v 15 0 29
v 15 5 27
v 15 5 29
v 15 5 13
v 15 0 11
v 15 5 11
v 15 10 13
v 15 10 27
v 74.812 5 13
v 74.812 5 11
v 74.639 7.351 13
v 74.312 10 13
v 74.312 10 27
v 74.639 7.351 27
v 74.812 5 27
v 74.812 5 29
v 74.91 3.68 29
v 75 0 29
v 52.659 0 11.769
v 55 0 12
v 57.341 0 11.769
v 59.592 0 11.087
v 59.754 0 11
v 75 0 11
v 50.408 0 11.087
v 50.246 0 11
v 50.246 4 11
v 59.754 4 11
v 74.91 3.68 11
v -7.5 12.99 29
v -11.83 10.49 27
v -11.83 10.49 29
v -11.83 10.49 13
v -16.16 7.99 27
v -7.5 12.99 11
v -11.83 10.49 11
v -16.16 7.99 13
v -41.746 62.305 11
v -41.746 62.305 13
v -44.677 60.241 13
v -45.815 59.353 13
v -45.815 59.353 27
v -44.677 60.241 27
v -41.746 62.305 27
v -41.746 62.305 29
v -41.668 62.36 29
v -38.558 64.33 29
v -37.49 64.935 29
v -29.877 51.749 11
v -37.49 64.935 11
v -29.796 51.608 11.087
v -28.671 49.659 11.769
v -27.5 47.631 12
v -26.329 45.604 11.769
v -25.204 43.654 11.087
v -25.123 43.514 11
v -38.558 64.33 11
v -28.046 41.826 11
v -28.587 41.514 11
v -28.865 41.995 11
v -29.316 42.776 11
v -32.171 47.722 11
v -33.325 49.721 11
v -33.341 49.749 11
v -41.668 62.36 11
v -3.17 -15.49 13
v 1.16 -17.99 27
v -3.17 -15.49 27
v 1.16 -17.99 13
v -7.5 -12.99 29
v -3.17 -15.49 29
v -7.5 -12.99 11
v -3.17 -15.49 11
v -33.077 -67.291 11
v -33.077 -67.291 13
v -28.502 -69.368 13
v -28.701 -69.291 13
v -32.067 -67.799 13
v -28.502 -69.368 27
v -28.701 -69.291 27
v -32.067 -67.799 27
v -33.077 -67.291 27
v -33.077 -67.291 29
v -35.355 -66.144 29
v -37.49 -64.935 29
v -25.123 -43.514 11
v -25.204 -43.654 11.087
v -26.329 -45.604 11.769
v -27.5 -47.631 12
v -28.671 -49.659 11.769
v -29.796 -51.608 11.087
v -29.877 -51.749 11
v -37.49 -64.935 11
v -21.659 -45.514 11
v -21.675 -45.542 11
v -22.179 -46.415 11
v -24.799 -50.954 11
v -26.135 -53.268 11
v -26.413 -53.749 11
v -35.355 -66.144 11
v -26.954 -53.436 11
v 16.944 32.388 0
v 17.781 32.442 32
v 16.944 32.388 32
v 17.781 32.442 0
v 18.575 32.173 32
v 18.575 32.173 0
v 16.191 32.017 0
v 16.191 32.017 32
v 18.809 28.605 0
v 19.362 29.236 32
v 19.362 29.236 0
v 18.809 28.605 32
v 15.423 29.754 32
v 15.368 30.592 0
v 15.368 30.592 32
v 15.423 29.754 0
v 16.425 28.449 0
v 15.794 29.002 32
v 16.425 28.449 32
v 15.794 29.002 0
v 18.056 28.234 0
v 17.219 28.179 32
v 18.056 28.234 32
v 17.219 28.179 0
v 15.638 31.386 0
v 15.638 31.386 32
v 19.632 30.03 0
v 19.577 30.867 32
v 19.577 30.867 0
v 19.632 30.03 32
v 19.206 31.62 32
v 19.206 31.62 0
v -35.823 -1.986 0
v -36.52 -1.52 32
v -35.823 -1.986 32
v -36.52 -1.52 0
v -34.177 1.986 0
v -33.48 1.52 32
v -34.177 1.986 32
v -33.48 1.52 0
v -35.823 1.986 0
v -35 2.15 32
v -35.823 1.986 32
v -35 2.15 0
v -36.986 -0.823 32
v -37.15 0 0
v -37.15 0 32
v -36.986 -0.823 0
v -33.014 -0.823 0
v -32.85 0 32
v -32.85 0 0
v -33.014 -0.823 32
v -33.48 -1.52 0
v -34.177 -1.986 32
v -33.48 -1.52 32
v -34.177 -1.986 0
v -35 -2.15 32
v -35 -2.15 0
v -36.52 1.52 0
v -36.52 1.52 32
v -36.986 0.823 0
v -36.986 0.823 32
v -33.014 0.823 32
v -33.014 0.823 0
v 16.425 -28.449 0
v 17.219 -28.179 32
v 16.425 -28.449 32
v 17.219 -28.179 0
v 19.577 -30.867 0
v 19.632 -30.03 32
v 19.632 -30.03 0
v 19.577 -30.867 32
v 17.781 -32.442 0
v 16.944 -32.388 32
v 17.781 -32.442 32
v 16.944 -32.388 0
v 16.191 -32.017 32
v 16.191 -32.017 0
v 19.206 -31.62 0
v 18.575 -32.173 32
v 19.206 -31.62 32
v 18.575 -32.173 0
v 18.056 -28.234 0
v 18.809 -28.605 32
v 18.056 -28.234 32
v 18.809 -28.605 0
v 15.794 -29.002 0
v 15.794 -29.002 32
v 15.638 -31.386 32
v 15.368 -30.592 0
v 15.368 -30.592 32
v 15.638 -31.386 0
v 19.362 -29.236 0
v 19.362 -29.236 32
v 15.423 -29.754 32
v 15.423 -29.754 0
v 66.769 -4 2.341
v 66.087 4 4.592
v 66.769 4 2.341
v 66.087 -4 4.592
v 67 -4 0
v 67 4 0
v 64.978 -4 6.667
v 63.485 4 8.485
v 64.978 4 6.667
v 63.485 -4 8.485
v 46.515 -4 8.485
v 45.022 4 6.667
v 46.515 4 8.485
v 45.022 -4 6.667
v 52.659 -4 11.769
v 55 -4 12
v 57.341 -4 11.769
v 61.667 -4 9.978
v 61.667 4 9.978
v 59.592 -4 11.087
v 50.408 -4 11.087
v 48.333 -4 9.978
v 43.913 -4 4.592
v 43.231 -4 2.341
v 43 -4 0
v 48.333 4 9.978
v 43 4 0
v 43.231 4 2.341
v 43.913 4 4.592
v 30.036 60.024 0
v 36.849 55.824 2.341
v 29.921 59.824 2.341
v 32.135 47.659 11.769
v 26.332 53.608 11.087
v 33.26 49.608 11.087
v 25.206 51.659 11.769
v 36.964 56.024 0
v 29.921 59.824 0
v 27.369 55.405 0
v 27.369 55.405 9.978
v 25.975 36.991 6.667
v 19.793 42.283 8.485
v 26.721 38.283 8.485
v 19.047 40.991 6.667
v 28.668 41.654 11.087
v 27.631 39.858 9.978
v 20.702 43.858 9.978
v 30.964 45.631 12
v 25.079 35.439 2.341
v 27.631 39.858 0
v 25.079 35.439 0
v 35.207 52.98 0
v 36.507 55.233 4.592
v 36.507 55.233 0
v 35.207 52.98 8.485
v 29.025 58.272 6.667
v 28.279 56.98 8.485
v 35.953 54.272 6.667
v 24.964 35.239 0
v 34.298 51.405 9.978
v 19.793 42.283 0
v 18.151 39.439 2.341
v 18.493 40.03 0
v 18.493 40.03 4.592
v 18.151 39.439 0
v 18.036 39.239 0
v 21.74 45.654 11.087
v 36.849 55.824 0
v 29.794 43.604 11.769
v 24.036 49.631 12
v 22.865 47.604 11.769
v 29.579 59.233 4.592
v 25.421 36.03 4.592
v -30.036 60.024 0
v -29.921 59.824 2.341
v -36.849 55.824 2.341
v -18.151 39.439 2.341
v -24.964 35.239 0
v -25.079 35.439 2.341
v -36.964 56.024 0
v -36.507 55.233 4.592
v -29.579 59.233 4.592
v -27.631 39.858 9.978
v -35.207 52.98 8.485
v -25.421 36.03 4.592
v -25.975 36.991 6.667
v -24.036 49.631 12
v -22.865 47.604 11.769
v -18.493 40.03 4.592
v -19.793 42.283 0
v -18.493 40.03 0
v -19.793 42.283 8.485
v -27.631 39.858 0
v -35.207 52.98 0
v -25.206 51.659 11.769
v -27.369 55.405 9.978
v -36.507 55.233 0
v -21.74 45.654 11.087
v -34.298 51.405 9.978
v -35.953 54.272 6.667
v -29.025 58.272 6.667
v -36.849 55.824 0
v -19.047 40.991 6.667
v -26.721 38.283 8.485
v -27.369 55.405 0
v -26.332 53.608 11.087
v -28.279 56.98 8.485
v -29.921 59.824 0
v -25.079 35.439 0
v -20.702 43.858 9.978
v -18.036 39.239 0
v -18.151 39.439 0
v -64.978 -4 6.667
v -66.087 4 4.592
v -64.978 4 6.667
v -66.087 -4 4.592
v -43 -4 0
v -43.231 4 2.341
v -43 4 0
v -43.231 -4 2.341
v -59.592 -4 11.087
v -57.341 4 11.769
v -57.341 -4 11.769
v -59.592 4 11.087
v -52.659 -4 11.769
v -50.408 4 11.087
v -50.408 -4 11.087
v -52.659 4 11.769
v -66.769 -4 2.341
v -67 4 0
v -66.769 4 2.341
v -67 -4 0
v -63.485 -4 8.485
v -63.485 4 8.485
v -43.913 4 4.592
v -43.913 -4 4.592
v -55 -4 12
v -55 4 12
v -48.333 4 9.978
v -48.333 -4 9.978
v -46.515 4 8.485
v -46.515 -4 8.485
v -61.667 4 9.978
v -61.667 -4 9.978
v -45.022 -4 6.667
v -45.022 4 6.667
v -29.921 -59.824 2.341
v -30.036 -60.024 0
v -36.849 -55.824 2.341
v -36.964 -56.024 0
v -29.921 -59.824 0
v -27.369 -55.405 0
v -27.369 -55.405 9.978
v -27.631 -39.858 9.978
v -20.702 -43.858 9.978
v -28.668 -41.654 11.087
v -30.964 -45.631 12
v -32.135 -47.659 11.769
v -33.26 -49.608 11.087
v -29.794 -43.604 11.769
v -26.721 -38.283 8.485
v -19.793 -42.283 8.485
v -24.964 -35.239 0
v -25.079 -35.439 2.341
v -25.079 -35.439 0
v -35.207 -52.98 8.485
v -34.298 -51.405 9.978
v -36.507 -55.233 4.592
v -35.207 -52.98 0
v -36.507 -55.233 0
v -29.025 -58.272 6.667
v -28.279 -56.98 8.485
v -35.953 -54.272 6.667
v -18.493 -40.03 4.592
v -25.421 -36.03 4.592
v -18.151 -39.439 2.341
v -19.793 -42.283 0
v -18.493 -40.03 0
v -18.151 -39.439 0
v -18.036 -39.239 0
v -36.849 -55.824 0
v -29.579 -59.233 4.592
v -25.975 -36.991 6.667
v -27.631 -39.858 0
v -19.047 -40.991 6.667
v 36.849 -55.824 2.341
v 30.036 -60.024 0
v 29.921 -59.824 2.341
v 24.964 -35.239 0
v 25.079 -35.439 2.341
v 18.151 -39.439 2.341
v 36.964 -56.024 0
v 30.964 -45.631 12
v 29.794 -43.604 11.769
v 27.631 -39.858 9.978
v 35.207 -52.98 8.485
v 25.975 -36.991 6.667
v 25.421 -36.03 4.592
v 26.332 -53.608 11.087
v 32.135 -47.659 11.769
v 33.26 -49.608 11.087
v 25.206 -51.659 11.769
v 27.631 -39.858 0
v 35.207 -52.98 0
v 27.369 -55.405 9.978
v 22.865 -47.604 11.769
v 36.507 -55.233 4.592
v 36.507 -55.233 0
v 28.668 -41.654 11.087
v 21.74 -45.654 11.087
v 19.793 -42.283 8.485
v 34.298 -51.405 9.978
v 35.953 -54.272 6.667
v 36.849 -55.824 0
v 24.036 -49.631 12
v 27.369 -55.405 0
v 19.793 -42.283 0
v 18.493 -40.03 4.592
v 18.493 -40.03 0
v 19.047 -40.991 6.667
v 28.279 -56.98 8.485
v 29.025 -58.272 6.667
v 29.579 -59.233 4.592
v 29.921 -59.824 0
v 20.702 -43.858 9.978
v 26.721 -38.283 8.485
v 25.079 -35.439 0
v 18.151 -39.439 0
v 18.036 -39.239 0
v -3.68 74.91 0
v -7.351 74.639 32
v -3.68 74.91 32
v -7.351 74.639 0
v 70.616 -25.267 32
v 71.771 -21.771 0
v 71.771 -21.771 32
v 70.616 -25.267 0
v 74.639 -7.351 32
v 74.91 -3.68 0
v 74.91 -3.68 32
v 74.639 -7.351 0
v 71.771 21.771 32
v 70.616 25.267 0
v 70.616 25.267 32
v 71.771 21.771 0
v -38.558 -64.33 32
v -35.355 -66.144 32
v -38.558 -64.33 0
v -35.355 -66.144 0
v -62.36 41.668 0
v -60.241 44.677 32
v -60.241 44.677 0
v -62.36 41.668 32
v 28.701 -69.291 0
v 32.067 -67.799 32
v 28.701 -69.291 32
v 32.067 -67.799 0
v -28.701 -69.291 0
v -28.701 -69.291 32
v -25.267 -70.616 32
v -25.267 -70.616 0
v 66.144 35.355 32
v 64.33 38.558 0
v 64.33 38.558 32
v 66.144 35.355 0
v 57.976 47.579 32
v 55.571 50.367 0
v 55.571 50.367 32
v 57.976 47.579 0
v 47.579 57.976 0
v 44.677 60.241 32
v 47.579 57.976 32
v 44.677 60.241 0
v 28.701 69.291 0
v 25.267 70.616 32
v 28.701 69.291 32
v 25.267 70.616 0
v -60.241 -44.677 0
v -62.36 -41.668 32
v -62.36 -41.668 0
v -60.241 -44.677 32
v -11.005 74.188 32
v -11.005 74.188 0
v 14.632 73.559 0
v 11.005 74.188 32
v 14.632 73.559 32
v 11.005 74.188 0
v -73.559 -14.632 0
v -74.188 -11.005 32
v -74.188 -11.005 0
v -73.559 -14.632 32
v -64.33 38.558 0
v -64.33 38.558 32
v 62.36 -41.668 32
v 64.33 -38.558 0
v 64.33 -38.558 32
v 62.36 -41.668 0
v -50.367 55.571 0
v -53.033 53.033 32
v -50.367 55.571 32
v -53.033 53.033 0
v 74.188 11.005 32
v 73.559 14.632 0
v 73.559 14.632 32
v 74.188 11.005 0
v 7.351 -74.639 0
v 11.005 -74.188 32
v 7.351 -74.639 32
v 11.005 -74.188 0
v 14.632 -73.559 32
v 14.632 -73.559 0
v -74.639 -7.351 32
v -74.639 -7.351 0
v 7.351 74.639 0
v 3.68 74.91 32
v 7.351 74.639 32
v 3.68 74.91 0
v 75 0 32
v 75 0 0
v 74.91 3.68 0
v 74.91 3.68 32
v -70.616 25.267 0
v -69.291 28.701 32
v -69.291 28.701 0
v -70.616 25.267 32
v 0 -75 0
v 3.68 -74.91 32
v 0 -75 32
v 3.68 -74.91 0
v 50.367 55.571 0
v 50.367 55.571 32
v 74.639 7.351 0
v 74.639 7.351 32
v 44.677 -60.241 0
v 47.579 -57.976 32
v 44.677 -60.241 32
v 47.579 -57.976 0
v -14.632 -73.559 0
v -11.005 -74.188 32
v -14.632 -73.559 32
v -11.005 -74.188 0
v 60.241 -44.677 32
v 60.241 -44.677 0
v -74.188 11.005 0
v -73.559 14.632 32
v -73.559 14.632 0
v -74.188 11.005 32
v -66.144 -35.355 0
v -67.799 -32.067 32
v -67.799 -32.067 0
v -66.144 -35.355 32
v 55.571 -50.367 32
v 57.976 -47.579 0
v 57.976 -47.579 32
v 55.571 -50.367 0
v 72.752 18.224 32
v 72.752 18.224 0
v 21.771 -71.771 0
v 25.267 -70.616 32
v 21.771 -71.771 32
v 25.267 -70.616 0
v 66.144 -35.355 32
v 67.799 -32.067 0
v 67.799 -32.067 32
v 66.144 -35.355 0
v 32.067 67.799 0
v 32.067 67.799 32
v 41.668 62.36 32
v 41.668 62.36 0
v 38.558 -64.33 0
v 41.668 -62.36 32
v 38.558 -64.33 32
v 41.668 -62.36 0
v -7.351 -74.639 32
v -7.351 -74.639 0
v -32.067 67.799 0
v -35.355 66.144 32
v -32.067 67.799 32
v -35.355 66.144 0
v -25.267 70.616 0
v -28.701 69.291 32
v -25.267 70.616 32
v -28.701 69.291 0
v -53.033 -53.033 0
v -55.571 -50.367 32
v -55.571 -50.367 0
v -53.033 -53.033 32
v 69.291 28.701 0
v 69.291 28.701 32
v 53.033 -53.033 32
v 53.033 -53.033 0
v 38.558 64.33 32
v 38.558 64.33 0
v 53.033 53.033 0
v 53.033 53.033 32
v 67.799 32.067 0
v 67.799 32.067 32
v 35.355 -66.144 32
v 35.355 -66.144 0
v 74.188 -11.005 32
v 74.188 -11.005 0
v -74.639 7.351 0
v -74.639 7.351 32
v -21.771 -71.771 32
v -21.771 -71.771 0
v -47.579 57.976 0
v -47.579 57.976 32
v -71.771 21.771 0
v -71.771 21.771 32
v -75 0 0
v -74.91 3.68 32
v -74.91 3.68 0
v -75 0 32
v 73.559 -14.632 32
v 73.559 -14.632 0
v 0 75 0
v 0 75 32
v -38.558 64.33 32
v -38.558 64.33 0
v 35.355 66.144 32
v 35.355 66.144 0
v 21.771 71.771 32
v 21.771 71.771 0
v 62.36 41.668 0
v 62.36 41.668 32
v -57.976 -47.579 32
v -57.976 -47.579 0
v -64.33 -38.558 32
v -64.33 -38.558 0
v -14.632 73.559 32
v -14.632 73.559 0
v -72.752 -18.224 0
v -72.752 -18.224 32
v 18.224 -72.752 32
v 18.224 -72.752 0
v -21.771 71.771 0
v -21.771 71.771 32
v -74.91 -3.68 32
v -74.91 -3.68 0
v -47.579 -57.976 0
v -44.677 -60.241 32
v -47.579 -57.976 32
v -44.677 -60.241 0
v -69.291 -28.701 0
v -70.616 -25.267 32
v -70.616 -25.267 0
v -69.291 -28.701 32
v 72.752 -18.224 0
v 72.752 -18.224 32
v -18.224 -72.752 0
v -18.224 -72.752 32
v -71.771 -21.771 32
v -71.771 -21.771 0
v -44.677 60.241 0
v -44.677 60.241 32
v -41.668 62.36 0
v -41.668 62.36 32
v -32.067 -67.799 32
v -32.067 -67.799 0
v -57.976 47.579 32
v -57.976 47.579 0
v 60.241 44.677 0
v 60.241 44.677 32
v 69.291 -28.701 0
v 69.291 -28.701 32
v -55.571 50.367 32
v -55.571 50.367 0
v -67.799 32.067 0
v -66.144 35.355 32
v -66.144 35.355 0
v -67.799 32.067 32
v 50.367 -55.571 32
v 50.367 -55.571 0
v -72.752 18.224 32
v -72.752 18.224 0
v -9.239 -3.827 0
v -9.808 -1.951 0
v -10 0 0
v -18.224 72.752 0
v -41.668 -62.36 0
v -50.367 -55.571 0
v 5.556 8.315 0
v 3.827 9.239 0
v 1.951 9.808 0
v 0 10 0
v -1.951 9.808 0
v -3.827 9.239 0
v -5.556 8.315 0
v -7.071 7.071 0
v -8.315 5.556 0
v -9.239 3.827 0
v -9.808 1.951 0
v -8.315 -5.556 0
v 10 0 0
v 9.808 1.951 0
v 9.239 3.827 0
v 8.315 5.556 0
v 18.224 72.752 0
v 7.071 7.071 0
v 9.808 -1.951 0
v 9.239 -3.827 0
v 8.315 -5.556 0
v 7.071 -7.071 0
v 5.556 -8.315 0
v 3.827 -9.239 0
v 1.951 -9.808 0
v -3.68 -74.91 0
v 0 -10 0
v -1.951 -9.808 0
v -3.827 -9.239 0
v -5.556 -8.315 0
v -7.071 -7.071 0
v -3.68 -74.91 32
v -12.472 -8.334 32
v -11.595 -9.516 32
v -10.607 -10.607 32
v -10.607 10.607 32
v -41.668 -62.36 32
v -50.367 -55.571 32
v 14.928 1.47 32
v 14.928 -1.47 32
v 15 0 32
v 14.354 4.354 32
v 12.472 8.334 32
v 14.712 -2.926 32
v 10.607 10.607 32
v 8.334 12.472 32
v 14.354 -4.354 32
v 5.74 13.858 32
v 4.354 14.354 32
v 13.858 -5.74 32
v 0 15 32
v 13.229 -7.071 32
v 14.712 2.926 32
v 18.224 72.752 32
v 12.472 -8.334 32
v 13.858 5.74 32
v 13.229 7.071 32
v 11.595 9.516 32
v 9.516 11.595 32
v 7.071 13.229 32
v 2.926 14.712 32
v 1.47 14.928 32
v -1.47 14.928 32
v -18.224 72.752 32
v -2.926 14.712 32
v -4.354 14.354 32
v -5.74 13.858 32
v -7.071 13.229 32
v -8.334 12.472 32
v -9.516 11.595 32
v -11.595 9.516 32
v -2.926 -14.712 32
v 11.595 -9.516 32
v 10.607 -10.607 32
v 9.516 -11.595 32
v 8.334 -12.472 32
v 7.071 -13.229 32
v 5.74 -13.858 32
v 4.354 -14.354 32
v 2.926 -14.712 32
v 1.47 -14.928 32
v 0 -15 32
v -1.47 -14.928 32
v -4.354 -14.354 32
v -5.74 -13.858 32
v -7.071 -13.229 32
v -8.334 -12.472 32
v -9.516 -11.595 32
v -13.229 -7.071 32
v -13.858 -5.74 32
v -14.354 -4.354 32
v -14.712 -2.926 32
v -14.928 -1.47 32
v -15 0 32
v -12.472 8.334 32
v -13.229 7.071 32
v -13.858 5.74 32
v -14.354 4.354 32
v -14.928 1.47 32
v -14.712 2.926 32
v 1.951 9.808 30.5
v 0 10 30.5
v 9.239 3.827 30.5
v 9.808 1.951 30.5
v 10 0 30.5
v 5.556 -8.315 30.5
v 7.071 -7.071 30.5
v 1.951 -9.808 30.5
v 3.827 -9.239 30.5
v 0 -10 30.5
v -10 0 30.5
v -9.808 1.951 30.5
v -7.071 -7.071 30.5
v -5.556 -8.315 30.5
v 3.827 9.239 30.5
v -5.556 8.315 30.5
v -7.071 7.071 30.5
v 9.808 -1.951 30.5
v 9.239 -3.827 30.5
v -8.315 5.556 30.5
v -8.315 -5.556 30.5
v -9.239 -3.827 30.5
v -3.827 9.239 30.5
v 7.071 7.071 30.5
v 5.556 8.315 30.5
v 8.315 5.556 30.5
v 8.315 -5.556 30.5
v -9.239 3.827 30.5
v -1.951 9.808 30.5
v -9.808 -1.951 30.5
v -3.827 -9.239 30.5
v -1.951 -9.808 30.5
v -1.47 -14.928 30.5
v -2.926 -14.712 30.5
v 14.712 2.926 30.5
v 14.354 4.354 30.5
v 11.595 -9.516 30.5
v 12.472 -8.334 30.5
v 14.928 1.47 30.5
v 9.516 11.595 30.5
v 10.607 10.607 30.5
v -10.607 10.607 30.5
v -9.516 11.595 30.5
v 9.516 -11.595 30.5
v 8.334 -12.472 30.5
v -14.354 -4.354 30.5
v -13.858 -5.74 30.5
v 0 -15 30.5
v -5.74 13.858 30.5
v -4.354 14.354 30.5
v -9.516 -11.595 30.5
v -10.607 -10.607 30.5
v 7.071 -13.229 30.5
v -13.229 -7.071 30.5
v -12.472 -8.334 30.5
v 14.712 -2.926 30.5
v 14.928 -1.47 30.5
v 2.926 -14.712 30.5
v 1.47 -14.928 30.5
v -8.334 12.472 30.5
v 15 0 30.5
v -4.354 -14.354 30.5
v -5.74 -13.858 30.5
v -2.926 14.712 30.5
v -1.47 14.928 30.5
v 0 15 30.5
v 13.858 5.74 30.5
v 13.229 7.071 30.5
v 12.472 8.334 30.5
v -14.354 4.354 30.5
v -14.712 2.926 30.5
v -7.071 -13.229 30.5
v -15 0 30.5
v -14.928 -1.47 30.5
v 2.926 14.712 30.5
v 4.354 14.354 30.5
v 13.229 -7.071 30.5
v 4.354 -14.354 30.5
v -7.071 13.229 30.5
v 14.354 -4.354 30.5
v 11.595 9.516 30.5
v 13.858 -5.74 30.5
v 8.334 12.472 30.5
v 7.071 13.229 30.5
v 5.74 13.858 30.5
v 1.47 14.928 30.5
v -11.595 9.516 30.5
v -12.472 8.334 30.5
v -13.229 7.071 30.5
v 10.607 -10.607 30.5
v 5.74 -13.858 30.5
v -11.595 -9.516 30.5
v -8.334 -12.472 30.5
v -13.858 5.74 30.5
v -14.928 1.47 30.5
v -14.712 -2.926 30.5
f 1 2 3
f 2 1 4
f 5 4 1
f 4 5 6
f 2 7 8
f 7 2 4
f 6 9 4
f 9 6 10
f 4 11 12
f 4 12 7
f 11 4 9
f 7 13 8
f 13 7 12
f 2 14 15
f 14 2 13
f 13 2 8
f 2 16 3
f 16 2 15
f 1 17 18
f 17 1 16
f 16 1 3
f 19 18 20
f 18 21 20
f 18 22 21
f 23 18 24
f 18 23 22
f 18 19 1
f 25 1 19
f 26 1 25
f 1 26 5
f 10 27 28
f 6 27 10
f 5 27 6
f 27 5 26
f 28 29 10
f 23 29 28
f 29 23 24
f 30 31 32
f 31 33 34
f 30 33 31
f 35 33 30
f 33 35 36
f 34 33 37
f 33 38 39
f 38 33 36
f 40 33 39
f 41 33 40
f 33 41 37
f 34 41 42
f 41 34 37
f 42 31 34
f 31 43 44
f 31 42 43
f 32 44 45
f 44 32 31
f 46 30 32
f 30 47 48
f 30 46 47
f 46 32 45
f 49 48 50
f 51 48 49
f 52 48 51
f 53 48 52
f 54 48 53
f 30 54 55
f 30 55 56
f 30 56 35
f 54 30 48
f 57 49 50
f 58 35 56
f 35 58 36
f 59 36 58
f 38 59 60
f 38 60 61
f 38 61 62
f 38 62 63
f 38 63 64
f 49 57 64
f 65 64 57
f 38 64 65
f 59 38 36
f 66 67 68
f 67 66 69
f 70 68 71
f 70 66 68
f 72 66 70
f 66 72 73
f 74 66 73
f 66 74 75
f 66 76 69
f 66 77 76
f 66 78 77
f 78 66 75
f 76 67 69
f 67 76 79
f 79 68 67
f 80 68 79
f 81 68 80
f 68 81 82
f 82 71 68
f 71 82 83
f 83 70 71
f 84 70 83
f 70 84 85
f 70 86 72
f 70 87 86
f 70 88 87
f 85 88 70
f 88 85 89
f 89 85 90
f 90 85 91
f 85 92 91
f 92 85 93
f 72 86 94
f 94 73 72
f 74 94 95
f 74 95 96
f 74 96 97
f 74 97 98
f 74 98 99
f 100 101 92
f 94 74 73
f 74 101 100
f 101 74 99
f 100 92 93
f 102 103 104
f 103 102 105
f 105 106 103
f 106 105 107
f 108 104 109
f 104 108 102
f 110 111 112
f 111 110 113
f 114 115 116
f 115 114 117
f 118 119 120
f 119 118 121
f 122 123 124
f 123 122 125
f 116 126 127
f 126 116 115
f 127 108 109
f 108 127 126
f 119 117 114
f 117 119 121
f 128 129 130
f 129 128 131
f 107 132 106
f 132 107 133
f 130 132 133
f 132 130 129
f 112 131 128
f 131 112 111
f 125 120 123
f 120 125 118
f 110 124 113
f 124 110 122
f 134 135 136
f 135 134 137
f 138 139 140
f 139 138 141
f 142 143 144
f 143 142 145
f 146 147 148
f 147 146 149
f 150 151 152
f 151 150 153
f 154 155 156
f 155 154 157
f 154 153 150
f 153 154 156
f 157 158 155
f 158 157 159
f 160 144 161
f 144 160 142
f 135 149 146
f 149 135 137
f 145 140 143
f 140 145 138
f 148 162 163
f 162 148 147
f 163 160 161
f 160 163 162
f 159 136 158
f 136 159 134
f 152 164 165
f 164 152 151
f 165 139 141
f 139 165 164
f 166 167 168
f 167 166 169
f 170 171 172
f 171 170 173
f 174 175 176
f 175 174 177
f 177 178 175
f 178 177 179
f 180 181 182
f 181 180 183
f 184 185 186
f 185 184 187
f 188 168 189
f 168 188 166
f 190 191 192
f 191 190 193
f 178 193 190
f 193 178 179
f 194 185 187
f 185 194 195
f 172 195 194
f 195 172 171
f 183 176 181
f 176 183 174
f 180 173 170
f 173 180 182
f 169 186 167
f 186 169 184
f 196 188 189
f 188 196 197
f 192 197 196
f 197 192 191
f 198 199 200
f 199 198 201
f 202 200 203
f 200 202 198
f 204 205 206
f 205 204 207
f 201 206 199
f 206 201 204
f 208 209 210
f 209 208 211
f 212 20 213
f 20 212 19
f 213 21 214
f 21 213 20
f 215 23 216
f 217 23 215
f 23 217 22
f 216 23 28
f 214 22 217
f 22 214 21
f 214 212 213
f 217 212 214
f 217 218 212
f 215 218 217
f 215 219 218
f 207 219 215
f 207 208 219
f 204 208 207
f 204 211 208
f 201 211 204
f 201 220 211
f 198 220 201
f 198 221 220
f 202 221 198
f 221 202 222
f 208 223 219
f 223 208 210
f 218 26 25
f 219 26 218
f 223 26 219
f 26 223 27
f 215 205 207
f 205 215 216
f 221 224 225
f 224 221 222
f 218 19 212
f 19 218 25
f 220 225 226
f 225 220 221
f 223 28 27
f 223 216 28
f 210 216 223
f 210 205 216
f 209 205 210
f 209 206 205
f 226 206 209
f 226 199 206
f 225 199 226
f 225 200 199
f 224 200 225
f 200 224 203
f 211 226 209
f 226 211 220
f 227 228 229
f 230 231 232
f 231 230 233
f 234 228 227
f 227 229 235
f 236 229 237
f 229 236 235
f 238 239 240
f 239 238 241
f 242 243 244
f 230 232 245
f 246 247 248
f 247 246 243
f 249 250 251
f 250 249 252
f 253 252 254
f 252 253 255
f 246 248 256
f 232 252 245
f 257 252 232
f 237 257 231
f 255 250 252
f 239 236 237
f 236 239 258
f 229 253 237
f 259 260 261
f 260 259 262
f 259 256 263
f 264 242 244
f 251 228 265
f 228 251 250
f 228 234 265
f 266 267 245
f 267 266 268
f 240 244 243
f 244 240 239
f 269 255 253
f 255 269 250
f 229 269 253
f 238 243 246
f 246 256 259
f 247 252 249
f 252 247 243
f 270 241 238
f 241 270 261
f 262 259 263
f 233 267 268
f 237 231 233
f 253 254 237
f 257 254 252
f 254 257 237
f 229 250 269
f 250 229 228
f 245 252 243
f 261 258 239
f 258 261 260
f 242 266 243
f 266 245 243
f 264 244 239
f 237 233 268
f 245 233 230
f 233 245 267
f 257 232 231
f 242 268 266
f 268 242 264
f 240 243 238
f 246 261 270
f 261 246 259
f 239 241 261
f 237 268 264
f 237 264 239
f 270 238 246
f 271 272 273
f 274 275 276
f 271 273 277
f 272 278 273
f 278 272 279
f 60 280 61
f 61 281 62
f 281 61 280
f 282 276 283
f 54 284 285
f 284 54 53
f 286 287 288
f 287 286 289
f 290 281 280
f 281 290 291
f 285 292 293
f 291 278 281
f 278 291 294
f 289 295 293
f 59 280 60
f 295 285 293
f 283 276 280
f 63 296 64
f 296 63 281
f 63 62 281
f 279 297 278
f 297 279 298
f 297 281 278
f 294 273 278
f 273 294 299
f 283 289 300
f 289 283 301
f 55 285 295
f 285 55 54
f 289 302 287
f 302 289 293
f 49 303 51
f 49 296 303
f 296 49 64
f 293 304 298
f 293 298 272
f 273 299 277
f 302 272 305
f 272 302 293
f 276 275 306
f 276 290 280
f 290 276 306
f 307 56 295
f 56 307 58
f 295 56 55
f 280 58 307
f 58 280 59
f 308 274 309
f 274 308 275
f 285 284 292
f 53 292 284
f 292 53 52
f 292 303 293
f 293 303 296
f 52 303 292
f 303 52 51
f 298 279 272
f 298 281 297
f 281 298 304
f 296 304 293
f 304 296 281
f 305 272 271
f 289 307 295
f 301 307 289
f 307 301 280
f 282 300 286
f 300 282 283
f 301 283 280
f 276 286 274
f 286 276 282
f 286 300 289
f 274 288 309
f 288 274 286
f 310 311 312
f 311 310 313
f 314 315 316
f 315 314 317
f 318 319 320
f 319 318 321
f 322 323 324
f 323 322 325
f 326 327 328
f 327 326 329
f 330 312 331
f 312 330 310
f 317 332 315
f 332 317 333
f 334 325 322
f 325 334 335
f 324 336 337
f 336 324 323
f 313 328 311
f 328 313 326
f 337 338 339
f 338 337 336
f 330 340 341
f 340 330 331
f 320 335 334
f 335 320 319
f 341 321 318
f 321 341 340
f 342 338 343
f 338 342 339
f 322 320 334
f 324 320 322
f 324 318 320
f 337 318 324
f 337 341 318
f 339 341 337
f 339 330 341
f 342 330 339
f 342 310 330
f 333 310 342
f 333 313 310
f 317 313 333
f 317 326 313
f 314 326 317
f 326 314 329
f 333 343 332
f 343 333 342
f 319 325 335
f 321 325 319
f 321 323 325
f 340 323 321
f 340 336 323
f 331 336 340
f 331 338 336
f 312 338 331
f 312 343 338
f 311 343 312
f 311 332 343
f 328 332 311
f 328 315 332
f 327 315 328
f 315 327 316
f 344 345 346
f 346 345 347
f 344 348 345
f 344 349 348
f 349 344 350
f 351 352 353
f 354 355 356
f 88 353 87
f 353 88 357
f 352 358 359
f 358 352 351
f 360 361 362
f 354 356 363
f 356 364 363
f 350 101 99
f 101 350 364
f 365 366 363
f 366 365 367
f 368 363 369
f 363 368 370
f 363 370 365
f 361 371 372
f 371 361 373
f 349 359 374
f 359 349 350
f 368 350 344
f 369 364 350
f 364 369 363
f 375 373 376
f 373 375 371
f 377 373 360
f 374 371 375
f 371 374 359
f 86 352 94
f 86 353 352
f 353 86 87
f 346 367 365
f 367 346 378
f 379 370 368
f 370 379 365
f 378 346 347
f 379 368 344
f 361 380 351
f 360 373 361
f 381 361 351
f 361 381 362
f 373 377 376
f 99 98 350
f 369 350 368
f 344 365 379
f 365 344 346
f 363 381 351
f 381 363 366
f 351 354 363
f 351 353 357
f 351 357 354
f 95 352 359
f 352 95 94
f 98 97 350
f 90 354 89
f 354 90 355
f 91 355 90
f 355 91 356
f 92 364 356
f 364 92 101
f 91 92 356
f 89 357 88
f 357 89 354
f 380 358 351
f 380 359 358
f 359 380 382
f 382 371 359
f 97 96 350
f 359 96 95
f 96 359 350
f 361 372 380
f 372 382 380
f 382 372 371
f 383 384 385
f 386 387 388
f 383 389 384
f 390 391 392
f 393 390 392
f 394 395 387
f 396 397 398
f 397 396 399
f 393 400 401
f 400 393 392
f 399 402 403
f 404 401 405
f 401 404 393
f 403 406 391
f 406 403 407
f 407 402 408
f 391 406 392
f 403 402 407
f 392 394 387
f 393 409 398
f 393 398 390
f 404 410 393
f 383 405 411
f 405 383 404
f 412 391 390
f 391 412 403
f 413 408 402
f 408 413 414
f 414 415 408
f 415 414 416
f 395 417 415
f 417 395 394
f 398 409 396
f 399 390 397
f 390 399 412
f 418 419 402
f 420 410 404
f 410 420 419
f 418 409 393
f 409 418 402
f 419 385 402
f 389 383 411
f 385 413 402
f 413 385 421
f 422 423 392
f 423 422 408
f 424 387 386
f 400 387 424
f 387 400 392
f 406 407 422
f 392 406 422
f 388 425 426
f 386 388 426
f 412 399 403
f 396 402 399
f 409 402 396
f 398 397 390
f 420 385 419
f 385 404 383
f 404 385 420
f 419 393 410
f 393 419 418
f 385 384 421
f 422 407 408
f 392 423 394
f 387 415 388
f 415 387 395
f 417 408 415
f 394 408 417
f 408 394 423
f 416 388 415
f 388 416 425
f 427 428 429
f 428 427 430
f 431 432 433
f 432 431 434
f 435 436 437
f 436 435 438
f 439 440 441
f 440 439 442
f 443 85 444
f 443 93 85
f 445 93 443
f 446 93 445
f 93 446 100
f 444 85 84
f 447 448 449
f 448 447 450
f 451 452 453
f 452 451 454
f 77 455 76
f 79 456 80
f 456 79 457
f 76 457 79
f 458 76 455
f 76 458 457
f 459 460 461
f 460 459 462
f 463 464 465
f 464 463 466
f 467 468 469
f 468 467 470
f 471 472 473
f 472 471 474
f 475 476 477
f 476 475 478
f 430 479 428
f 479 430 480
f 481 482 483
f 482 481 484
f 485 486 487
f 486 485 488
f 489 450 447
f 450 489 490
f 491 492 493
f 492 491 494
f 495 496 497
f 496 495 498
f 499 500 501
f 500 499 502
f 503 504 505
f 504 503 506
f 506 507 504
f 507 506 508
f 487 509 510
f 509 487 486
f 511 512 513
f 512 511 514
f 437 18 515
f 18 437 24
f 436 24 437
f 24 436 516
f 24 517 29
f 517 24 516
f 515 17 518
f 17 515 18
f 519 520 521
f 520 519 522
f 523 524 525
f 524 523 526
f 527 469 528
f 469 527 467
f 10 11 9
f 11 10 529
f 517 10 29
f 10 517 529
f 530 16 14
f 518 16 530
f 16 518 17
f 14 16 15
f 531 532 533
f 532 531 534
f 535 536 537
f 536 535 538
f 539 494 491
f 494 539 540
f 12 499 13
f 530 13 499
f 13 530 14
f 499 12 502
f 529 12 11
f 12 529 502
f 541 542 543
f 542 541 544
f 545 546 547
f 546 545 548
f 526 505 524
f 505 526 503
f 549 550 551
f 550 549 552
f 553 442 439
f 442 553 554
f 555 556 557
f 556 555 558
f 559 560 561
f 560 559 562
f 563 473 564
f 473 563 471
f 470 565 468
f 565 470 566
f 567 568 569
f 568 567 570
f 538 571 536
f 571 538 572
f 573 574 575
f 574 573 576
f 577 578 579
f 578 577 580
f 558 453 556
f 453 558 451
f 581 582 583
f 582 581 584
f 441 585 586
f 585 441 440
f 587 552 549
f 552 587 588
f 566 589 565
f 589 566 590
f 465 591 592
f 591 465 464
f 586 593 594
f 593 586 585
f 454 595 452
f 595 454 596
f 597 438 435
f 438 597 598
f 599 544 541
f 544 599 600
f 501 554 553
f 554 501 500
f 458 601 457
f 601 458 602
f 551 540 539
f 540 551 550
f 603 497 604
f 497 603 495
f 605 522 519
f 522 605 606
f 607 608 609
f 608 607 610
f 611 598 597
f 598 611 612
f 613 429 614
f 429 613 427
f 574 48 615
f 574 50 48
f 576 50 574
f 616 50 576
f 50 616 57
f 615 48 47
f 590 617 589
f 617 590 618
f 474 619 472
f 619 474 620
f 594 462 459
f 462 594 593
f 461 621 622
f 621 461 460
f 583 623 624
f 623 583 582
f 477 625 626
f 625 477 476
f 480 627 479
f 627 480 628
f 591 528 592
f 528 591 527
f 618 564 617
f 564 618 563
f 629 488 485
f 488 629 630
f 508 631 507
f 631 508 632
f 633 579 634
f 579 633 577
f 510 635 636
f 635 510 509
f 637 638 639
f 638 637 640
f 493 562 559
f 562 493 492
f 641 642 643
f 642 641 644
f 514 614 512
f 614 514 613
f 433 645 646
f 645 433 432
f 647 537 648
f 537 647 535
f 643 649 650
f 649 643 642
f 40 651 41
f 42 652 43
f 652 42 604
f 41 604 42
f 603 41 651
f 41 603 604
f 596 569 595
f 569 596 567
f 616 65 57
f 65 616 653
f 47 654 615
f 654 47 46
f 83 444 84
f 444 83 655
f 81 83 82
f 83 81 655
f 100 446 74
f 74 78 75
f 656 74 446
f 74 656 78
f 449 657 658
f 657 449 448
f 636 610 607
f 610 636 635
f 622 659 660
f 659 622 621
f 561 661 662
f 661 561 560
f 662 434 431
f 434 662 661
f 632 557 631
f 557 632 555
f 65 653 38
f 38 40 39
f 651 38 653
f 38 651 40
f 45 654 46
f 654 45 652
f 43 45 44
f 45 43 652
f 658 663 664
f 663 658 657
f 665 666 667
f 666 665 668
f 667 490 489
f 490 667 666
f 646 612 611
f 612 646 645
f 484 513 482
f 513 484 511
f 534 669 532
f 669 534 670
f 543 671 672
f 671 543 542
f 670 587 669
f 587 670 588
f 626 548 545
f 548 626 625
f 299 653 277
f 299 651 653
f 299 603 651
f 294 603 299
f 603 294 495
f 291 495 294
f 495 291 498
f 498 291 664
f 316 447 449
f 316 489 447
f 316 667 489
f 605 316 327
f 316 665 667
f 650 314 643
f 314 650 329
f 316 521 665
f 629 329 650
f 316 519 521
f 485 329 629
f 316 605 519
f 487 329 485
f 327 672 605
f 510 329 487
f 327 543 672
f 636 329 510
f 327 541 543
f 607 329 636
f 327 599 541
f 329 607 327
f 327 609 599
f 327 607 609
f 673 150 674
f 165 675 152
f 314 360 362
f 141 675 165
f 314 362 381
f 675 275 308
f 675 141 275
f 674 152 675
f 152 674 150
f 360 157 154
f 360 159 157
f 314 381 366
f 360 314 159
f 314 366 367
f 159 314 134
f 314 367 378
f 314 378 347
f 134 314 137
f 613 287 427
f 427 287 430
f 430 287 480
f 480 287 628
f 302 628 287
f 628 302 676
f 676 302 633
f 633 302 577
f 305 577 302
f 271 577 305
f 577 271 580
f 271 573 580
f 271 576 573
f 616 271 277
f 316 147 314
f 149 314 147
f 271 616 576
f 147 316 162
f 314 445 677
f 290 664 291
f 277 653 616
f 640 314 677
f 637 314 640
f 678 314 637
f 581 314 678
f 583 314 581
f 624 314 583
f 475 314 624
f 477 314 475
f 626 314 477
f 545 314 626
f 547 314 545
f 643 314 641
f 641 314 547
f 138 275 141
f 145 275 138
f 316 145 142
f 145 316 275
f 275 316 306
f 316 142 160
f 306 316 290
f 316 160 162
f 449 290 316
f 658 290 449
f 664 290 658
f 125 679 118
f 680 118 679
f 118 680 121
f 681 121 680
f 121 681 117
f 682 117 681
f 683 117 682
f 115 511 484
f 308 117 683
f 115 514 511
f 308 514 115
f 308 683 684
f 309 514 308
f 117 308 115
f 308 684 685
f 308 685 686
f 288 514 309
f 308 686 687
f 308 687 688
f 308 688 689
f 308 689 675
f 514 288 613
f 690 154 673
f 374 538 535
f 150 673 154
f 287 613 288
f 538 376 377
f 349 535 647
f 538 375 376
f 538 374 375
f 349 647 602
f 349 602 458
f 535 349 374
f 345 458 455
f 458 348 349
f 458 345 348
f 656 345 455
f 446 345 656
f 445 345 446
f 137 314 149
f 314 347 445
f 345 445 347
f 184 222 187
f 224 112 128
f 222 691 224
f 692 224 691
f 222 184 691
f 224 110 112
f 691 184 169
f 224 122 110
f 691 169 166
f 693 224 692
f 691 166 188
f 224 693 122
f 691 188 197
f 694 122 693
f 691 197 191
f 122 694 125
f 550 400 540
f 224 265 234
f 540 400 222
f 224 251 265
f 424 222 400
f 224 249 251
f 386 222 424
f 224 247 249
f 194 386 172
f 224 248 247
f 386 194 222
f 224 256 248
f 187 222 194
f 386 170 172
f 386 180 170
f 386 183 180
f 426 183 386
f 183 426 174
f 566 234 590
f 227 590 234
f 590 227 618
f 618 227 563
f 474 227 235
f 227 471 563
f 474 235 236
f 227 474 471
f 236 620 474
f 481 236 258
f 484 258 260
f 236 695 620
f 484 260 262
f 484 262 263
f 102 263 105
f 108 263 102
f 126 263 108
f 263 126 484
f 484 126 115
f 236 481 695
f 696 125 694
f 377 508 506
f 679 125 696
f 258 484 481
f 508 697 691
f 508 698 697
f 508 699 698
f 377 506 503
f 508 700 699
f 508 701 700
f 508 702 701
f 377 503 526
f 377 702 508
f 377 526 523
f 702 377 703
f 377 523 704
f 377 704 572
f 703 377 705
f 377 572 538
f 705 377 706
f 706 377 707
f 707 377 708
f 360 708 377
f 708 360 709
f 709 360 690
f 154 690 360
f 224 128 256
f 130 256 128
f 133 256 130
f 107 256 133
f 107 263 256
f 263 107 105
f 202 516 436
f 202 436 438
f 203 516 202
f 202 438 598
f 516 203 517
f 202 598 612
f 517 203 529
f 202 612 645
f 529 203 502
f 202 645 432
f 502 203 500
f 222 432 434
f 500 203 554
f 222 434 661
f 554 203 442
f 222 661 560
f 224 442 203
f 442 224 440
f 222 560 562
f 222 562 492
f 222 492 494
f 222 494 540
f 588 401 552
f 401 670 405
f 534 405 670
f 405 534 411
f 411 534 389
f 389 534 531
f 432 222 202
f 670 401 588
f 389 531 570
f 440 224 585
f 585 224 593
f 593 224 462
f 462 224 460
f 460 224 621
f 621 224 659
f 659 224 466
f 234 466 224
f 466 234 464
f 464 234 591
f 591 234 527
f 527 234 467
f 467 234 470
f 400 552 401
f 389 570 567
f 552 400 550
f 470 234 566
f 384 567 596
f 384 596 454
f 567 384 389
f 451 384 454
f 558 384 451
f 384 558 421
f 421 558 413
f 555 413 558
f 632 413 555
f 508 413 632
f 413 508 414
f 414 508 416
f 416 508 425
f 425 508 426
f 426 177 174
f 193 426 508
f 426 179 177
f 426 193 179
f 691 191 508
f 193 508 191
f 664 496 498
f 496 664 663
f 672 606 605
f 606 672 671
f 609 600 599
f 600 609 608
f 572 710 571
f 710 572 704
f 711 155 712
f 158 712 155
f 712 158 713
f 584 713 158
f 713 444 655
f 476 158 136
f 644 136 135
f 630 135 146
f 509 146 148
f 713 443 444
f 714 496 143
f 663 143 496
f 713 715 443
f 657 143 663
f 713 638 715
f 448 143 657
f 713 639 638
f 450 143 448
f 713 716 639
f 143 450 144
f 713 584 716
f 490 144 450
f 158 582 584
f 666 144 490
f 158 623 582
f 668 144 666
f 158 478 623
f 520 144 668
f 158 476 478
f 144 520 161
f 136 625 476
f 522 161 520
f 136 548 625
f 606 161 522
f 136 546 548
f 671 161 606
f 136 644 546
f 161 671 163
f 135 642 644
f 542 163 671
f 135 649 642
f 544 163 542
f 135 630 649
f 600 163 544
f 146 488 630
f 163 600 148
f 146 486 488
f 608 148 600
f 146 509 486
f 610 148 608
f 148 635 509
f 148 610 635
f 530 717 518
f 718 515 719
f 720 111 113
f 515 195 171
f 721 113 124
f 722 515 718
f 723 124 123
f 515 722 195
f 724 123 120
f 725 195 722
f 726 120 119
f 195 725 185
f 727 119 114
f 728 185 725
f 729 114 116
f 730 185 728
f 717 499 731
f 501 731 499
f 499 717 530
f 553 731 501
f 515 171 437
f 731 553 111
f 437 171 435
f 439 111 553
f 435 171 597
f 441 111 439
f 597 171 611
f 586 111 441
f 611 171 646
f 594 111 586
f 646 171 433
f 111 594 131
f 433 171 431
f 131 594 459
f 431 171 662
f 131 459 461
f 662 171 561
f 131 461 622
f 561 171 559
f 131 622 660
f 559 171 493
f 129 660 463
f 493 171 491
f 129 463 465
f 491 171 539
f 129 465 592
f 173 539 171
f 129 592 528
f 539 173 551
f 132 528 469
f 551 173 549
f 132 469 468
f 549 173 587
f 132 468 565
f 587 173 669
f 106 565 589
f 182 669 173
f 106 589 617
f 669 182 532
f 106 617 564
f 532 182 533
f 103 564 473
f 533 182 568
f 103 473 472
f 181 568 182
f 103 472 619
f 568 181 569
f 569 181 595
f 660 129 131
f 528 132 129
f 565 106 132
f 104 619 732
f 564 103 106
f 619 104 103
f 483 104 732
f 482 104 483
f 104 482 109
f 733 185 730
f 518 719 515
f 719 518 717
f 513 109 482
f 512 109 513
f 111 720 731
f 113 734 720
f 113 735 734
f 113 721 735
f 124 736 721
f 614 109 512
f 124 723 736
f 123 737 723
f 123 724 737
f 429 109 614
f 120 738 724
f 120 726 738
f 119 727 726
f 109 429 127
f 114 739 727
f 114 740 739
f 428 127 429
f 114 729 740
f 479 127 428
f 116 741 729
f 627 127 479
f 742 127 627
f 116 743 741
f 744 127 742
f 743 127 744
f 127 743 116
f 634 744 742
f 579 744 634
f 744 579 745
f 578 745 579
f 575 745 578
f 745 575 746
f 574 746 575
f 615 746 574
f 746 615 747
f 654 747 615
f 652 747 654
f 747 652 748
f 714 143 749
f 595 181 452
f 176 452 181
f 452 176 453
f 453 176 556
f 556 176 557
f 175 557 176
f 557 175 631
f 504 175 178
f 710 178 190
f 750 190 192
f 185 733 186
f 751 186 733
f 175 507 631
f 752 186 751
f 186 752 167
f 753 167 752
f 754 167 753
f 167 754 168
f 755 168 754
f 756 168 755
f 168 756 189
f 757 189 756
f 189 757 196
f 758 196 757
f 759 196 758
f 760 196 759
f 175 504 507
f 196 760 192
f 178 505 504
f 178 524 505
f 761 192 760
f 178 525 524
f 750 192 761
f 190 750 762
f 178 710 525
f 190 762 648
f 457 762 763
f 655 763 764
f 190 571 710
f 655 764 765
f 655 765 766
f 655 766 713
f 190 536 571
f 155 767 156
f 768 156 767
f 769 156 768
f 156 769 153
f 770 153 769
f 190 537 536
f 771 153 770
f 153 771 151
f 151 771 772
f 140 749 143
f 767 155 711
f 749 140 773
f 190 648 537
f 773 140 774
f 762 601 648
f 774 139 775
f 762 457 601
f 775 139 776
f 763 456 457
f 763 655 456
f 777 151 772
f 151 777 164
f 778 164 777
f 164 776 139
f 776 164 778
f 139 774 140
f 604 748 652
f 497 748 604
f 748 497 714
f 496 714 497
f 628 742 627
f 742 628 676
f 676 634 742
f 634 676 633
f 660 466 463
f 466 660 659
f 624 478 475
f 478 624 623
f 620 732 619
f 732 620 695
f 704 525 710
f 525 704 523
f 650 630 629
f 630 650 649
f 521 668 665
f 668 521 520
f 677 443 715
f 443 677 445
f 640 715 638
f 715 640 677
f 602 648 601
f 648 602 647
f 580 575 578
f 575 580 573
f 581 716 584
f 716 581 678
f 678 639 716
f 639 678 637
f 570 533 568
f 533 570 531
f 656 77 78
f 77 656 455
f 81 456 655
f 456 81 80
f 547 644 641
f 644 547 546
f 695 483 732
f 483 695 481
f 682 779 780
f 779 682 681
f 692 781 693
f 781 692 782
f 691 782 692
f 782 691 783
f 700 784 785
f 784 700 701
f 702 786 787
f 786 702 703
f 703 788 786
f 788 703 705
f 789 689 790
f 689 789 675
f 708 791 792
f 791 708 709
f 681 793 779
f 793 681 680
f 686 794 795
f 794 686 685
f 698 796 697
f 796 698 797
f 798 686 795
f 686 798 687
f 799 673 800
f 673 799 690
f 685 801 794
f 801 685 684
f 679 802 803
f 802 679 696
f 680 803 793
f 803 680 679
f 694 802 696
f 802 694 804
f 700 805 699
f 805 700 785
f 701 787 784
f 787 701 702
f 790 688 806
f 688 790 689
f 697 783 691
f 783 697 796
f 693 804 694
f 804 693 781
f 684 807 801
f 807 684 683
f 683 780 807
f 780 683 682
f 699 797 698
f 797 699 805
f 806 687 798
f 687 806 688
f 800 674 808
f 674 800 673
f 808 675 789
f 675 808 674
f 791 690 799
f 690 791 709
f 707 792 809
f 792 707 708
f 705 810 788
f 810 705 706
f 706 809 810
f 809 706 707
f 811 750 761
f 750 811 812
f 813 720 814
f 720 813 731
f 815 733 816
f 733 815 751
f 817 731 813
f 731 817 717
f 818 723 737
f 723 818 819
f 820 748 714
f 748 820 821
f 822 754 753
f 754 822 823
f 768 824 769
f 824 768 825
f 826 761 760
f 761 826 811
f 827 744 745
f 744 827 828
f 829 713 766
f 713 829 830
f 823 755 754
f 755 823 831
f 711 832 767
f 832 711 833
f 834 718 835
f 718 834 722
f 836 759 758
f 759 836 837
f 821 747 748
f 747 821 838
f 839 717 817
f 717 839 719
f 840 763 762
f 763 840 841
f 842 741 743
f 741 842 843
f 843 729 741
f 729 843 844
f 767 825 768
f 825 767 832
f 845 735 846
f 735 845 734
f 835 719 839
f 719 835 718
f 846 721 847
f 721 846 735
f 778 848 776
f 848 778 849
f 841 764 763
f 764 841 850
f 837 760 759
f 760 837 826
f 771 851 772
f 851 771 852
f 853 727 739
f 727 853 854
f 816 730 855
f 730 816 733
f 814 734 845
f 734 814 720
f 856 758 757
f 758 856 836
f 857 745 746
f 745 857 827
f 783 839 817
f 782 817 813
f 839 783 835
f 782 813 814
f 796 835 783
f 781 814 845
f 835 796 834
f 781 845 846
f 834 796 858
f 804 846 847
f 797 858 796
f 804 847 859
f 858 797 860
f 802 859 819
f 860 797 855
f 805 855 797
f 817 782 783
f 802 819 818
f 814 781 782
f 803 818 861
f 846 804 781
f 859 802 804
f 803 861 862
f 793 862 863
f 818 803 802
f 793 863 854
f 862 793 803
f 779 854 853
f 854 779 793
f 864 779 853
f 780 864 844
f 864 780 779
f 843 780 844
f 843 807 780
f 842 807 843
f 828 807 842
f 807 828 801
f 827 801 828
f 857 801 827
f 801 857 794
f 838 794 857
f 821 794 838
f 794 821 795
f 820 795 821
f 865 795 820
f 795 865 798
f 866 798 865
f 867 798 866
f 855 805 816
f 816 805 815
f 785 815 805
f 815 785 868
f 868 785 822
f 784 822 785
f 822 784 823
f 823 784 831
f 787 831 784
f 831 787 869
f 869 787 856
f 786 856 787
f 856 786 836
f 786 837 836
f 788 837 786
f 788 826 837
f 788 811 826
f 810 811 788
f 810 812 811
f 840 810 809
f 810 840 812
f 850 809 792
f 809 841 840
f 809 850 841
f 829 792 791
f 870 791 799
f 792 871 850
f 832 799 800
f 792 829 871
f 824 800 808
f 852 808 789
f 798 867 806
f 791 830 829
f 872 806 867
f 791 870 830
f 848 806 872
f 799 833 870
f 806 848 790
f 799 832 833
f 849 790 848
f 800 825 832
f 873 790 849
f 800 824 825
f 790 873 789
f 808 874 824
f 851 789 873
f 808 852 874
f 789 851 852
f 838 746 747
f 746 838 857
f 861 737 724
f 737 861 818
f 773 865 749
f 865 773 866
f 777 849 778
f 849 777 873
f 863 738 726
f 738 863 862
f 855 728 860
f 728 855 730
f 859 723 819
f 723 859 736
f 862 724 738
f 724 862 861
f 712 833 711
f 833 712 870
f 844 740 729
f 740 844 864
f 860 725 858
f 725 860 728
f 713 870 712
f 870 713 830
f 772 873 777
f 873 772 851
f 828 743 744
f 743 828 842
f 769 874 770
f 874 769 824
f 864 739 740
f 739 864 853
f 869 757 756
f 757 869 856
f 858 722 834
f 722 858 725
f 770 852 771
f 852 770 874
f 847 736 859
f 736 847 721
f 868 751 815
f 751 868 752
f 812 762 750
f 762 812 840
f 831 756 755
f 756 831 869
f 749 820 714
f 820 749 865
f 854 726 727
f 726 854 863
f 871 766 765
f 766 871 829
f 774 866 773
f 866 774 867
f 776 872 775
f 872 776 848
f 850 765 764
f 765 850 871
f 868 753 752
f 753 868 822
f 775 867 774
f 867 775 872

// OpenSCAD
/**
 * chuck_mechanism.scad — TM-CWND-001 Rev A
 * Adjustable Chuck for Coil Winder Spindle
 *
 * Three modules (print separately):
 *   1. chuck_body()     — outer ring + jaw tracks, mounts to spindle
 *   2. chuck_jaw()      — print 3×, adjustable, M5 grub screw clamp
 *   3. chuck_backplate()— secures to spindle shaft, flanged
 *
 * Range: 6.35mm (1/4") to 102mm (4") coil former diameter
 *
 * Design: sliding T-slot jaw, not scroll chuck (simpler 3D print)
 * Jaw extension: 0 (fully retracted) to 40mm (fully extended)
 * At zero extension: grips 6mm forms (using center bore rubber insert)
 * At max extension: grips 102mm forms (jaws at outer track limit)
 *
 * Print settings:
 *   Material: PETG (toughness, dimensional stability)
 *   Infill: 80% for chuck body, 100% for jaws
 *   Wall: 4 perimeters
 *   Layer: 0.15mm (jaw track accuracy)
 *
 * Print envelope:
 *   chuck_body: 160mm × 160mm × 35mm — fits in 200mm cube
 *   chuck_jaw:  60mm × 25mm × 20mm — print 3 at once
 *   backplate:  80mm × 80mm × 20mm
 */

// ─── Parameters ───────────────────────────────────────────────────────────────

chuck_od         = 150.0;  // Outer diameter of chuck body
chuck_h          = 32.0;   // Total height
chuck_id_bore    = 20.0;   // Center through-bore (spindle shaft pass-through)

// Jaw T-slot track geometry
jaw_count        = 3;
jaw_track_w      = 14.0;   // T-slot width at base
jaw_track_h      = 10.0;   // T-slot depth
jaw_track_len    = 50.0;   // Radial travel length
jaw_t_w          = 18.0;   // T-slot cap width (wider than base)
jaw_t_h          = 5.0;    // T-slot cap height
jaw_start_r      = 10.0;   // Track center radius at minimum position (jaw retracted)

// Jaw body
jaw_body_w       = 12.0;   // Jaw body width (fits in T-slot)
jaw_body_h       = jaw_track_h - 0.4;  // Height (sliding fit)
jaw_body_l       = 55.0;   // Jaw body length (extends inward + outward)
jaw_grip_w       = 20.0;   // Jaw face width (contacts former)
jaw_grip_h       = 20.0;   // Jaw face height
jaw_grip_step    = 5.0;    // Step from jaw body to grip face
jaw_grip_groove  = 2.0;    // Grip groove depth (texture)
jaw_setscrew_dia = 5.0;    // M5 set screw through jaw body

// Backplate
bp_od            = 80.0;
bp_h             = 18.0;
bp_bore          = 14.2;   // 14mm shaft + clearance
bp_bolt_sp       = 60.0;   // Bolt pattern (4× M4 to chuck body)
bp_key_w         = 4.0;    // Key flat width
bp_key_d         = 2.0;    // Key flat depth

// Chuck-to-backplate bolt pattern
c2bp_bolt_sp     = 70.0;
c2bp_bolt_dia    = 4.3;    // M4 clearance

// ─── Chuck Body ───────────────────────────────────────────────────────────────

module jaw_track_slot(angle) {
    // Single T-slot track at given angle
    rotate([0,0,angle])
    translate([chuck_od/2 - jaw_track_len - jaw_start_r, 0, 0])
    rotate([0,90,0]) {
        // T-slot cross-section extruded radially
        linear_extrude(jaw_track_len + chuck_od/2)
        polygon([
            [-jaw_t_w/2, 0],
            [-jaw_t_w/2, jaw_t_h],
            [-jaw_track_w/2, jaw_t_h],
            [-jaw_track_w/2, jaw_track_h],
            [ jaw_track_w/2, jaw_track_h],
            [ jaw_track_w/2, jaw_t_h],
            [ jaw_t_w/2, jaw_t_h],
            [ jaw_t_w/2, 0],
        ]);
    }
}

module chuck_body() {
    difference() {
        // Outer cylinder
        cylinder(h=chuck_h, d=chuck_od, $fn=128);

        // Center bore
        translate([0,0,-0.5])
            cylinder(h=chuck_h+1, d=chuck_id_bore, $fn=32);

        // Three jaw tracks at 120° intervals
        for (a=[0, 120, 240])
            translate([0, 0, chuck_h - jaw_track_h - 2])
                jaw_track_slot(a);

        // Chuck-to-backplate bolts (from front face)
        for (a=[60, 180, 300])
            rotate([0,0,a])
            translate([c2bp_bolt_sp/2, 0, -0.5])
                cylinder(h=chuck_h+1, d=c2bp_bolt_dia, $fn=16);

        // Weight relief pockets (back face)
        for (a=[0, 60, 120, 180, 240, 300])
            rotate([0,0,a])
            translate([chuck_od/2 - 20, 0, 0])
            rotate([90,0,0])
                cylinder(h=8, r=12, $fn=32, center=true);

        // Front face label recess
        translate([0,0,chuck_h-1.5])
            cylinder(h=2, d=30, $fn=64);
    }
}

// ─── Chuck Jaw ────────────────────────────────────────────────────────────────

module chuck_jaw() {
    difference() {
        union() {
            // T-slider body (fits in chuck T-slot)
            translate([0, -jaw_body_w/2, 0])
                cube([jaw_body_l - jaw_grip_step, jaw_body_w, jaw_body_h]);

            // T-cap (wider, engages T-slot)
            translate([0, -jaw_t_w/2 + 0.2, 0])
                cube([jaw_body_l - jaw_grip_step - 5, jaw_t_w - 0.4, jaw_t_h - 0.2]);

            // Grip face (extends inward toward chuck center)
            translate([jaw_body_l - jaw_grip_step, -jaw_grip_w/2, 0])
                cube([jaw_grip_step, jaw_grip_w, jaw_grip_h]);
        }
        // M5 clamp set screw (from side, locks jaw in track)
        translate([jaw_body_l/2, -jaw_body_w/2 - 1, jaw_body_h/2])
        rotate([-90,0,0])
            cylinder(h=jaw_body_w+2, d=jaw_setscrew_dia, $fn=16);

        // Grip face grooves (horizontal, texture for grip)
        for (z=[3, 8, 13])
            translate([jaw_body_l - jaw_grip_step - 0.5, -jaw_grip_w/2 - 0.5, z])
                cube([jaw_grip_step + 1, jaw_grip_w + 1, jaw_grip_groove]);
    }
}

// ─── Backplate ────────────────────────────────────────────────────────────────

module chuck_backplate() {
    // Mounts to spindle shaft, chuck body bolts to front face
    difference() {
        union() {
            cylinder(h=bp_h, d=bp_od, $fn=64);
            // Spindle shaft collar (extends behind main disc)
            cylinder(h=bp_h + 15, d=30, $fn=32);
        }
        // Shaft bore
        translate([0,0,-0.5])
            cylinder(h=bp_h+16, d=bp_bore, $fn=32);
        // Key flat (D-flat on shaft)
        translate([bp_bore/2 - bp_key_d, -bp_bore, -0.5])
            cube([bp_key_d+1, bp_bore*2, bp_h+16]);
        // Shaft set screw (M5 from side)
        translate([30/2+1, 0, bp_h+7])
        rotate([0,-90,0])
            cylinder(h=30, d=5.0, $fn=16);
        // Chuck bolt through holes
        for (a=[60,180,300])
            rotate([0,0,a])
            translate([c2bp_bolt_sp/2, 0, -0.5])
                cylinder(h=bp_h+1, d=c2bp_bolt_dia, $fn=16);
        // Weight relief
        for (a=[0,90,180,270])
            rotate([0,0,a])
            translate([bp_od/2-12, 0, bp_h/2])
            rotate([90,0,0])
                cylinder(h=8, r=7, $fn=16, center=true);
    }
}

// ─── Small Form Insert (rubber sleeve for <25mm forms) ────────────────────────

module small_form_insert() {
    // Press-fit rubber or foam insert for gripping small coil formers
    // Design: cylindrical, tapered ID
    insert_od = chuck_id_bore - 0.4;
    insert_id_top = 6.0;
    insert_id_bot = 20.0;
    insert_h  = 25.0;
    difference() {
        cylinder(h=insert_h, d=insert_od, $fn=32);
        cylinder(h=insert_h+1, d1=insert_id_bot, d2=insert_id_top, $fn=32);
    }
}

// ─── Render ───────────────────────────────────────────────────────────────────

$fn = 64;
print_part = "body";  // "body" | "jaw" | "backplate" | "insert" | "all"

if (print_part == "body") {
    color("lightgray") chuck_body();
} else if (print_part == "jaw") {
    // Print 3 at once
    for (i=[0:2])
        translate([i*65, 0, 0])
            color("orange") chuck_jaw();
} else if (print_part == "backplate") {
    color("lightblue") chuck_backplate();
} else if (print_part == "insert") {
    color("gray", 0.5) small_form_insert();
} else {
    // Assembly view
    color("lightgray", 0.8) chuck_body();
    color("lightblue", 0.8)
    translate([0, 0, -bp_h])
        chuck_backplate();
    for (a=[0, 120, 240])
        rotate([0,0,a])
        translate([chuck_od/2 - jaw_track_len/2 - jaw_start_r, 0,
                   chuck_h - jaw_track_h - 2])
            color("orange") chuck_jaw();
}

// ─── Notes ────────────────────────────────────────────────────────────────────
// ASSEMBLY:
// 1. Press backplate onto spindle shaft (key flat aligned), tighten M5 set screw
// 2. Insert jaws into T-slots from outer edge, slide inward until finger-tight
// 3. Tighten jaw M5 grub screws to lock at current position
// 4. For coil formers < 25mm OD: insert small_form_insert into center bore
//    and pinch former in place
// 5. For formers 25–102mm: extend jaws to contact, tighten grub screws
//
// BALANCE: Heavy-gauge wire wound at high RPM may unbalance the chuck.
// Maximum safe RPM with chuck: ~150 RPM (limited by bearing vibration)
// For >100 RPM: use lighter chuck or dynamically balance jaws.
